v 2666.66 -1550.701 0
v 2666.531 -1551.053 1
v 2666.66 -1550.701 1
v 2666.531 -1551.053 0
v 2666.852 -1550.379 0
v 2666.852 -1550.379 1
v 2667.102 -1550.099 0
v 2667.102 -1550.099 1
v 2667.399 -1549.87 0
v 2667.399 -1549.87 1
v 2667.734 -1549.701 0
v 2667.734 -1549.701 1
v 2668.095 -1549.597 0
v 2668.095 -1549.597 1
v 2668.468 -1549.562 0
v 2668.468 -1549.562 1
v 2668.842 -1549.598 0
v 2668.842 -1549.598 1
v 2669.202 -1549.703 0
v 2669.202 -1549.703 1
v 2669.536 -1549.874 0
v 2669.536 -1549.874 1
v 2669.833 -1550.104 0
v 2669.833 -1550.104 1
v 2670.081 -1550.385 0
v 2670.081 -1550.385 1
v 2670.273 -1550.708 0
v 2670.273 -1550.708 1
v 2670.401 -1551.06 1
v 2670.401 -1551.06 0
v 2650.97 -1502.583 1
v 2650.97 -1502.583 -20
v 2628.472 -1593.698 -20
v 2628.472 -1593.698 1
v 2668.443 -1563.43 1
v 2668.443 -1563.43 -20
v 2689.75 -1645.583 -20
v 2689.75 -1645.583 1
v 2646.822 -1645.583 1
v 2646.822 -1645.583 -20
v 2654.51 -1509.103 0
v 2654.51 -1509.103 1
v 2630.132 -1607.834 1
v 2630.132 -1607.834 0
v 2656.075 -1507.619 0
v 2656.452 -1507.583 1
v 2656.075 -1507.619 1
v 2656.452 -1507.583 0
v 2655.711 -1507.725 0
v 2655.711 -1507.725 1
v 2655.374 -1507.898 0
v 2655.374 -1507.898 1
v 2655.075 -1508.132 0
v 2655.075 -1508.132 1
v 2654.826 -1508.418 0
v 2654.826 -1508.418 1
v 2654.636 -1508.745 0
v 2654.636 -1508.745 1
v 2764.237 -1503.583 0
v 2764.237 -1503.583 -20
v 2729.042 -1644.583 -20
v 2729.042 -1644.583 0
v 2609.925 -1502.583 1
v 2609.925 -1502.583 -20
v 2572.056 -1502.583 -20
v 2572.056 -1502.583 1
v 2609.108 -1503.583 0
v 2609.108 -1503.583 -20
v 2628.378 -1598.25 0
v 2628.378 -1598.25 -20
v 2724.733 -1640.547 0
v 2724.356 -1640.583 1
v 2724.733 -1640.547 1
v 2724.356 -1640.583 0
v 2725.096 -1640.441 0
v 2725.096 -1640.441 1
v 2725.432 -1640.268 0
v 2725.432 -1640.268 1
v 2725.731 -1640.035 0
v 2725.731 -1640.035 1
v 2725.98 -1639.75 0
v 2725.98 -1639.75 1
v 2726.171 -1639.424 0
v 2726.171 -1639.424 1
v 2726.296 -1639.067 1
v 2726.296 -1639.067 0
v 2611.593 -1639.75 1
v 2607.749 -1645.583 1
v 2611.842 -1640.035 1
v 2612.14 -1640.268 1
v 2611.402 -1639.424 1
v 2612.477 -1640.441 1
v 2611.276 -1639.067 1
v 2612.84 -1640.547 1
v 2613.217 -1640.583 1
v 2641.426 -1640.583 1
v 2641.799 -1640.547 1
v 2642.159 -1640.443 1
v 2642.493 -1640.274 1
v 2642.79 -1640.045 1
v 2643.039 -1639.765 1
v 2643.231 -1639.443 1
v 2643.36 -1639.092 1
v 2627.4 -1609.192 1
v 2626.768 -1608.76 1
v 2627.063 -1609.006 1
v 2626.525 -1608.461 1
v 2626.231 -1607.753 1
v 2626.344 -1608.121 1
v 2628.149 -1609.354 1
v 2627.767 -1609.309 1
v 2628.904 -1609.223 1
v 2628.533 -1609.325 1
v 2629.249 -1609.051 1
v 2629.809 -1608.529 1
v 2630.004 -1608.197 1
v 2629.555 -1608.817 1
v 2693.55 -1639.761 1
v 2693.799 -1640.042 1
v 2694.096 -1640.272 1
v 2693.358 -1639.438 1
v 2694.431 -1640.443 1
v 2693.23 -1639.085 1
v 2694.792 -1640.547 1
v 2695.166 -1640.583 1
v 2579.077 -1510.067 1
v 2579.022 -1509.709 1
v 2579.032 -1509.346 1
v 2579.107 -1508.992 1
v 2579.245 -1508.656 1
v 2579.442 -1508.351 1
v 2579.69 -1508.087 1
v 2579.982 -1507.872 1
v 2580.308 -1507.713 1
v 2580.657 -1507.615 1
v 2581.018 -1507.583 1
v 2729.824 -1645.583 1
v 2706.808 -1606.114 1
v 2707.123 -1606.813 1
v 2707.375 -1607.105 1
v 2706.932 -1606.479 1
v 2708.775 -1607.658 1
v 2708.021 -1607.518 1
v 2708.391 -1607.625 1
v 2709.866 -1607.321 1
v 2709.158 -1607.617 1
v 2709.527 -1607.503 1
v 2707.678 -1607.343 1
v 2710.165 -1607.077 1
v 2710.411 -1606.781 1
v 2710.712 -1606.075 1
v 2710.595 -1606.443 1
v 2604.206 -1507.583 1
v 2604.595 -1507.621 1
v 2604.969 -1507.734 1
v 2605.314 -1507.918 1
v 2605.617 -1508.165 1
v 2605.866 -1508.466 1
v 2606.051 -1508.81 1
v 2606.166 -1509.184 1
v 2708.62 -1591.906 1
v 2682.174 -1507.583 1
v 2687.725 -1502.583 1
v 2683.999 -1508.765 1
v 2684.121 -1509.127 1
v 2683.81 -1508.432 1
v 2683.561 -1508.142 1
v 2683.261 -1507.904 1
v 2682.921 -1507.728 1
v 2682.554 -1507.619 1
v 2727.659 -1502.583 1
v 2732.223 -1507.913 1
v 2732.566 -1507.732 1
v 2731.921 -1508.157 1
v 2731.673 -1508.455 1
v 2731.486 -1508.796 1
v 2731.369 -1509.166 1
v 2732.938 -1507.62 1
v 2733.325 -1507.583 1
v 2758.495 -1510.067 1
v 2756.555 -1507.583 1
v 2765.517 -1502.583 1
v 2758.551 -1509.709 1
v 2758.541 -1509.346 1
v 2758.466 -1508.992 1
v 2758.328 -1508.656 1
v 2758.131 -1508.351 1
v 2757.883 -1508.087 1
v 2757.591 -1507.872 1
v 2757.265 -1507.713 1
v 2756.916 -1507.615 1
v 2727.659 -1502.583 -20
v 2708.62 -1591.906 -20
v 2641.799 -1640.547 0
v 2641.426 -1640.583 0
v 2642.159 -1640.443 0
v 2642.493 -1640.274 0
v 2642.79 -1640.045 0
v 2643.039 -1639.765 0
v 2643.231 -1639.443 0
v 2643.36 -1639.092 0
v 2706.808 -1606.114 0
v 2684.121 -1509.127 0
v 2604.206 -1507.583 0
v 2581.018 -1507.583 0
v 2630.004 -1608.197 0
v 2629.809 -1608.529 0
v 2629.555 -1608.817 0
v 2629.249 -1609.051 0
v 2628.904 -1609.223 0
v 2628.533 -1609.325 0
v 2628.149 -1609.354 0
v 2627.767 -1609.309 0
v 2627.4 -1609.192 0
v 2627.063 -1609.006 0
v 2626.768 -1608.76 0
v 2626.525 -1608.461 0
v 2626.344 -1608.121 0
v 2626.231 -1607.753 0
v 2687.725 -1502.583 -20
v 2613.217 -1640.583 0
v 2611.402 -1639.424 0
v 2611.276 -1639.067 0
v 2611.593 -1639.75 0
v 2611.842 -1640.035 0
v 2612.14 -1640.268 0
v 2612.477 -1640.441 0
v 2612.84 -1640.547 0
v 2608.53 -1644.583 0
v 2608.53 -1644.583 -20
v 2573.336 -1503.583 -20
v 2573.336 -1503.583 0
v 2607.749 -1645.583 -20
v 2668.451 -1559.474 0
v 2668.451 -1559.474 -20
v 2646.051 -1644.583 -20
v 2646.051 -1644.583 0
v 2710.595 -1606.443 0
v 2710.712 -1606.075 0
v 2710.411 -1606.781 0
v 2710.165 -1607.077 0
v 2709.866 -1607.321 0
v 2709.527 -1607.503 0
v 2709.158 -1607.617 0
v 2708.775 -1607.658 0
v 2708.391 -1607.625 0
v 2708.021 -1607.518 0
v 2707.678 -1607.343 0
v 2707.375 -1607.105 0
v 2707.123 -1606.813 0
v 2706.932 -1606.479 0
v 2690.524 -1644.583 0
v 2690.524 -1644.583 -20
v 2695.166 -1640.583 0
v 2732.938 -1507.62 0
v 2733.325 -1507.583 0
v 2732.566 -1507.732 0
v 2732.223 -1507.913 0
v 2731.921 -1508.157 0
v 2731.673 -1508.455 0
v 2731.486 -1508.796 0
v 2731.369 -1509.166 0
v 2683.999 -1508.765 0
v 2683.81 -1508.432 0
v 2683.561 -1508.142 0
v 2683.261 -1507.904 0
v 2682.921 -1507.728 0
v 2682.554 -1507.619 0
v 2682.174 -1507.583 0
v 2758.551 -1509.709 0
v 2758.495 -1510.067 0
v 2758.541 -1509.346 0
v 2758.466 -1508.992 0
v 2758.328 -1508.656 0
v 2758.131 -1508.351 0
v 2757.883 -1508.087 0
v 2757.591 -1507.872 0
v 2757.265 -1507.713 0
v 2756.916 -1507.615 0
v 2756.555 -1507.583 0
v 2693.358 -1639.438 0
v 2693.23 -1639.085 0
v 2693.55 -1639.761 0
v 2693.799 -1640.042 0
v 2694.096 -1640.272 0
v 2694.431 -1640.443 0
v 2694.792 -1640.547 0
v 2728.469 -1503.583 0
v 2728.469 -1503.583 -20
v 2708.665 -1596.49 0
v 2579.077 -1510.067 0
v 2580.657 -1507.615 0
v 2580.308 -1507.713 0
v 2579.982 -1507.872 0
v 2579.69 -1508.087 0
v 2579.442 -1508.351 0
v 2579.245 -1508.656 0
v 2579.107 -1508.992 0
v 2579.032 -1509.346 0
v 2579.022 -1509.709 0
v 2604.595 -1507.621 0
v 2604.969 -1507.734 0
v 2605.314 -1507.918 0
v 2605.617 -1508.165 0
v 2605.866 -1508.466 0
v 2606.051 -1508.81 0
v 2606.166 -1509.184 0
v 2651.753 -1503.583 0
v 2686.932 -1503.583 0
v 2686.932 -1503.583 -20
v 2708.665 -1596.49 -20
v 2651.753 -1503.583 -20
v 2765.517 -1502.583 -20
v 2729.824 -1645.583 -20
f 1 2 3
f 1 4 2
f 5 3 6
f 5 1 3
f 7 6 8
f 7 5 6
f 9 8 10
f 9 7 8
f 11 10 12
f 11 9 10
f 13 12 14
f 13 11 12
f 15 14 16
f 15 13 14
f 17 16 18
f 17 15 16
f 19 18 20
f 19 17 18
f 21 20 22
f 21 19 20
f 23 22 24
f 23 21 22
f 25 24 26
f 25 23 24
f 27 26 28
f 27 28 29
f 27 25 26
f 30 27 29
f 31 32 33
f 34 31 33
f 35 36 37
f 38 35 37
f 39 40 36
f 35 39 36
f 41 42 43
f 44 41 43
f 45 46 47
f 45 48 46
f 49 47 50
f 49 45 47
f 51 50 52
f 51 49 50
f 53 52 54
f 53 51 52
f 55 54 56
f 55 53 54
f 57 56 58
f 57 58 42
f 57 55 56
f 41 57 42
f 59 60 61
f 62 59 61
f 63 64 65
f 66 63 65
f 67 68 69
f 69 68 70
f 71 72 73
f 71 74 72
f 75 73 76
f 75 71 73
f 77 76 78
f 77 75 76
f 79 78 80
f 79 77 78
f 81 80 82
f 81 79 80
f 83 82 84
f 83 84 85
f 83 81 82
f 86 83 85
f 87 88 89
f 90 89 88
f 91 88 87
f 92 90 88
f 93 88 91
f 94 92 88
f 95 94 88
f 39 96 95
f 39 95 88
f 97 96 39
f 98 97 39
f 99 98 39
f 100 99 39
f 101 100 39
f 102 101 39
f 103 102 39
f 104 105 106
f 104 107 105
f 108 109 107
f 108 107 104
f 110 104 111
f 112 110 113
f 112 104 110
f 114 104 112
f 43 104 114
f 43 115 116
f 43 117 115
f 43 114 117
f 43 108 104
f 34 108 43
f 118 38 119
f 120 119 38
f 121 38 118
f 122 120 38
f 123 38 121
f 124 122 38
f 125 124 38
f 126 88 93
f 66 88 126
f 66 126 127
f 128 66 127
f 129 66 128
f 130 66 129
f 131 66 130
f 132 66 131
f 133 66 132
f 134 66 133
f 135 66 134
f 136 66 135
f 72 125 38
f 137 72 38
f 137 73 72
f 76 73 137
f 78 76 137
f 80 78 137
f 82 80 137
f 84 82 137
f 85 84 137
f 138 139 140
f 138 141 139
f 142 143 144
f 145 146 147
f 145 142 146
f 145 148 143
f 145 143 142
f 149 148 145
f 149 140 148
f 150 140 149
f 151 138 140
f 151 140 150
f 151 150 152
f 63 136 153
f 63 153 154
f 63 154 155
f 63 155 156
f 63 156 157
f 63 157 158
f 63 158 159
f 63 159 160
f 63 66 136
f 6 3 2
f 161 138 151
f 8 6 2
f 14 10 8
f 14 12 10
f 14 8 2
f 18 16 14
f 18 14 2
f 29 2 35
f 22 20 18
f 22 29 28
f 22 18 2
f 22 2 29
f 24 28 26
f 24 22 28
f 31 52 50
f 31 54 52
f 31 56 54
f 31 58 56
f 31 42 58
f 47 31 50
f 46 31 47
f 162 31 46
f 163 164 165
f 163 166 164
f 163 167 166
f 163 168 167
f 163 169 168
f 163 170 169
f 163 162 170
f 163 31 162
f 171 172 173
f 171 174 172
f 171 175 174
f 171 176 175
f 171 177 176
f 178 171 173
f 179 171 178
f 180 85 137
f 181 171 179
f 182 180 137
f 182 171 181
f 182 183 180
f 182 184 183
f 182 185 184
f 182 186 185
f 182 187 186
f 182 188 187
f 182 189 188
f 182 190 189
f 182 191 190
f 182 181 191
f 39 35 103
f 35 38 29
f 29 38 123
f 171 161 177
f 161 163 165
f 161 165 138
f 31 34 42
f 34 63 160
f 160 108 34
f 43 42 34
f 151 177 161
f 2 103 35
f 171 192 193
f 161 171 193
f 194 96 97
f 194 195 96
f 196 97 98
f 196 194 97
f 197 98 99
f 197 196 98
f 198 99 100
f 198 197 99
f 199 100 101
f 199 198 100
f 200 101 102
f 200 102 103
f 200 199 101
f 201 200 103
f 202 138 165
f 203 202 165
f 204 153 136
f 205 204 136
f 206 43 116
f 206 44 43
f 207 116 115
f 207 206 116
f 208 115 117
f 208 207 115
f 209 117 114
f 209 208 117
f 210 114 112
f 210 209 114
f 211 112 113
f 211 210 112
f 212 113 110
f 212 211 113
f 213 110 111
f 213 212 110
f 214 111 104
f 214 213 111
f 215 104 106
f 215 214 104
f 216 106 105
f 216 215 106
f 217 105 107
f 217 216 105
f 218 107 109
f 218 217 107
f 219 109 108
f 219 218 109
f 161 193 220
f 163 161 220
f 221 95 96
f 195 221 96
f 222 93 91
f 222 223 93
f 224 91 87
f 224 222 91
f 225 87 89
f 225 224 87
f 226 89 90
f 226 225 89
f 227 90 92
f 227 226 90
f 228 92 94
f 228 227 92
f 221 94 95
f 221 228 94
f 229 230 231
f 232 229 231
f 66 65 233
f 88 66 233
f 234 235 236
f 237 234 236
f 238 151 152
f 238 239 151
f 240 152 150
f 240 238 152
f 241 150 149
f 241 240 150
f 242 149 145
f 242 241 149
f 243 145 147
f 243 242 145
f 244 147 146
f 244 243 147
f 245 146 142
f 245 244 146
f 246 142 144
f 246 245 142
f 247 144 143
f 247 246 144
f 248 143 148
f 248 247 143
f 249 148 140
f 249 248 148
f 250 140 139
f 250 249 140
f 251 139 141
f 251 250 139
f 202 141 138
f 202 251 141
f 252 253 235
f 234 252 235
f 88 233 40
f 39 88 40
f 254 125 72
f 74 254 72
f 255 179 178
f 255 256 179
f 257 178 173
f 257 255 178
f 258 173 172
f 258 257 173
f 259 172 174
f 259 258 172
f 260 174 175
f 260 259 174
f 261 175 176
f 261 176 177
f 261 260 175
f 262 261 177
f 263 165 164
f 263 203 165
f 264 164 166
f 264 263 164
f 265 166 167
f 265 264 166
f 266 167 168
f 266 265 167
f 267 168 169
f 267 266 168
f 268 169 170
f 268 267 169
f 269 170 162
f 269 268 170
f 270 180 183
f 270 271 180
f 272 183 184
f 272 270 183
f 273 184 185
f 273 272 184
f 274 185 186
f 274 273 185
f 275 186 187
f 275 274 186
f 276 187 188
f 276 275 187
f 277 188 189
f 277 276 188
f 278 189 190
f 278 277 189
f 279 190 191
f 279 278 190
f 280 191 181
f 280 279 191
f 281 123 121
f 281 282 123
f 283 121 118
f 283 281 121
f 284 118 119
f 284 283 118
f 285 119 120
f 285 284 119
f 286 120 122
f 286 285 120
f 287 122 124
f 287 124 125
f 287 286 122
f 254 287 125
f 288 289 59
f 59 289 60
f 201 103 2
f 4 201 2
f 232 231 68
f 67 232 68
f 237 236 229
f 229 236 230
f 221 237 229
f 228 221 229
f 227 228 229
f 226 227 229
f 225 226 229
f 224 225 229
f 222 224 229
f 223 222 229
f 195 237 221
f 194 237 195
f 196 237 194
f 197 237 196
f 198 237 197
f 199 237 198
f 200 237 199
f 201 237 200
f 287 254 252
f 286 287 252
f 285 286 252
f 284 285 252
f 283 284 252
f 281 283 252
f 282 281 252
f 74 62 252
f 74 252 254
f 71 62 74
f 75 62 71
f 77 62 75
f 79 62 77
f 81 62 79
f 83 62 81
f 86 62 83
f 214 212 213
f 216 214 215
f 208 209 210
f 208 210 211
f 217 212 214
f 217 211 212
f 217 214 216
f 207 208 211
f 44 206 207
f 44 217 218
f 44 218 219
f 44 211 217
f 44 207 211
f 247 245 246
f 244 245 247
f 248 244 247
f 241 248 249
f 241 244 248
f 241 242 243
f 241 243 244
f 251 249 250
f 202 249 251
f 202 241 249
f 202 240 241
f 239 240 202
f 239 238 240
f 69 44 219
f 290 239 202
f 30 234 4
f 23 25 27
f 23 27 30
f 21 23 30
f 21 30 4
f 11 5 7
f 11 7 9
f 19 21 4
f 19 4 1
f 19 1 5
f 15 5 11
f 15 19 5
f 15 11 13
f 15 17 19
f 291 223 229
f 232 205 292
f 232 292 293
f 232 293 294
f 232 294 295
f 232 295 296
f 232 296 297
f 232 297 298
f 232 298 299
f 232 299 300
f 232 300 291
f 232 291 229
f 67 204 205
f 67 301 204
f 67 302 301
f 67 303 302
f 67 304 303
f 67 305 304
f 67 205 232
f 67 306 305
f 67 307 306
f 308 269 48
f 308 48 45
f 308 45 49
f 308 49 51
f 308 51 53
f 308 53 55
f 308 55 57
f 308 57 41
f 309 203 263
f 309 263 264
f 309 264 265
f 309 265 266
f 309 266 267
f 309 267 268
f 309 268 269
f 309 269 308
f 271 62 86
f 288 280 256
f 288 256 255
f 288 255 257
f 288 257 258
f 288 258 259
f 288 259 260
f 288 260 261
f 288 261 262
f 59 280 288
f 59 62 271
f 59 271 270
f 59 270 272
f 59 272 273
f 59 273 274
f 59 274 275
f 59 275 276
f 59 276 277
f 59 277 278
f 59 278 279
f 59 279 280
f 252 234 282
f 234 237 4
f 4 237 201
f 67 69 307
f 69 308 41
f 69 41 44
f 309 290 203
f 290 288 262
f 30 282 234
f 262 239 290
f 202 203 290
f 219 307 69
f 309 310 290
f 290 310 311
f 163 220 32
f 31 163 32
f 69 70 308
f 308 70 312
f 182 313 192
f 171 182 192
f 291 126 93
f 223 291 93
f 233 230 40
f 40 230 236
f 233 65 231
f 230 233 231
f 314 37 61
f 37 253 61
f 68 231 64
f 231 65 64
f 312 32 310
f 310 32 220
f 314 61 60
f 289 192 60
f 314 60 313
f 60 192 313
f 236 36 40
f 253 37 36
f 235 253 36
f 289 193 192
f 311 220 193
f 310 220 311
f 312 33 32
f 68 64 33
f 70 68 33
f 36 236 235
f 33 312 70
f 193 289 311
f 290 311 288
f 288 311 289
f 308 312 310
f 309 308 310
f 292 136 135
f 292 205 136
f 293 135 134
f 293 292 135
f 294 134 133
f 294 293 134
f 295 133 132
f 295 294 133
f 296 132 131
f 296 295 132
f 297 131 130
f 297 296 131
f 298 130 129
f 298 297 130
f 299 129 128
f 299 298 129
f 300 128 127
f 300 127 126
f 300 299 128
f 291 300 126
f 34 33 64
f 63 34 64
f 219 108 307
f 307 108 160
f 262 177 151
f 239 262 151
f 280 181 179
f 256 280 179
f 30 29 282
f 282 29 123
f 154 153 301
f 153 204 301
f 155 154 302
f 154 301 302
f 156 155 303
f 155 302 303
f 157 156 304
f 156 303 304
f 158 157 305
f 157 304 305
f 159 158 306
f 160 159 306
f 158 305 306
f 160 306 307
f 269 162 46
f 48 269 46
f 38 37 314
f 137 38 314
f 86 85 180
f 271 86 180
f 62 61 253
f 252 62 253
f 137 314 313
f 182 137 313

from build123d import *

# Parameters (mm, degrees)
BOSS_EXTRUDE1_DEPTH      = 1
BOSS_EXTRUDE1_DEPTH_BACK = 20
CUT_EXTRUDE1_DEPTH       = 20
CUT_EXTRUDE2_DEPTH       = 213.08892348854144
FILLET1_R                = 2


with BuildPart() as part:
    # Sketch1 → Boss-Extrude1 (new, two sides: drawn at the far end of the back side and taken through both)
    with BuildSketch(Plane.XY.offset(-BOSS_EXTRUDE1_DEPTH_BACK)):
        Polygon((2646.8216415771526, -1645.5825778387778), (2668.443454041995, -1563.4301992512205), (2689.750003141614, -1645.5825778387778), (2729.823511169442, -1645.5825778387778), (2765.5169447137464, -1502.5825778387775), (2727.659454154938, -1502.5825778387775), (2708.6195188972147, -1591.9057308997028), (2687.7252140876417, -1502.5825778387775), (2650.9700988373584, -1502.5825778387775), (2628.472349976695, -1593.6984607244628), (2609.9247872531955, -1502.5825778387775), (2572.055836643681, -1502.5825778387775), (2607.749270187985, -1645.5825778387778), align=None)
    extrude(amount=BOSS_EXTRUDE1_DEPTH + BOSS_EXTRUDE1_DEPTH_BACK)

    # 3DSketch1 → Cut-Extrude1 (cut)
    with BuildSketch(Plane(origin=(2690.52373407352, -1644.582577838785, -20), x_dir=(-0.6391782942740818, 0.7690585856284783, 0), z_dir=(0, 0, -1))):
        Polygon((0, 0), (79.56194930817296, 37.42380228418931), (28.42614813473769, -34.202308612791946), (52.4083937415845, -63.05771883529219), (183.34103881667534, -1.388e-14), (160.4765333052003, 27.510546630372875), (75.35406283201465, -18.178865153681013), (133.21853325786614, 60.30734081323959), (110.73293100318098, 87.3619914825534), (25.390706940818667, 44.69138476980368), (84.18362231643819, 119.30608903866502), (61.32155847684101, 146.81369785225445), (-24.620317595277953, 29.62313770222462), align=None)
    extrude(amount=-CUT_EXTRUDE1_DEPTH, mode=Mode.SUBTRACT)

    # 3DSketch2 → Cut-Extrude2 (cut, through all)
    with BuildSketch(Plane(origin=(2605.8400476167385, -1507.582577838778, 1), x_dir=(0.6701296542123282, -0.7422440613068356, 0), z_dir=(0, 0, 1))):
        Polygon((0, 0), (-18.350017001032523, -20.32471038743184), (102.61499812527803, -84.81138938300774), (123.59854919676319, -61.56974342682699), (68.74754201218234, 22.323071235087976), (157.54150984392544, -23.97409189109885), (179.1863444024586, 0), (102.71443922113765, 113.76780902490334), (84.34650287386148, 93.42325094344824), (148.62854454728856, 4.588347978661769), (52.21635833956266, 57.83549741007506), (32.86694064083099, 36.40383819852962), (95.66426345437596, -56.51066473506117), align=None)
    extrude(amount=-CUT_EXTRUDE2_DEPTH, mode=Mode.SUBTRACT)

    # Fillet1
    fillet1_edges = [part.edges().sort_by_distance(p)[0] for p in [
        (2611.6546507267108, -1640.5825778387798, 0.5),
        (2642.967324236363, -1640.5825778387775, 0.5),
        (2578.4572614861936, -1507.5825778387775, 0.5),
        (2605.8400476167385, -1507.582577838778, 0.5),
        (2654.885691895029, -1507.5825778387768, 0.5),
        (2683.7598322604117, -1507.5825778387764, 0.5),
        (2668.478981227683, -1543.650680619036, 0.5),
        (2693.618657801144, -1640.5825778387807, 0.5),
        (2725.918130630729, -1640.5825778387841, 0.5),
        (2759.115519871237, -1507.5825778387766, 0.5),
        (2731.7059936223714, -1507.582577838777, 0.5),
        (2708.8461168186655, -1614.826444325335, 0.5),
        (2628.0028021057956, -1616.4582814852965, 0.5),
    ]]
    fillet(fillet1_edges, radius=FILLET1_R)


solid = part.part
